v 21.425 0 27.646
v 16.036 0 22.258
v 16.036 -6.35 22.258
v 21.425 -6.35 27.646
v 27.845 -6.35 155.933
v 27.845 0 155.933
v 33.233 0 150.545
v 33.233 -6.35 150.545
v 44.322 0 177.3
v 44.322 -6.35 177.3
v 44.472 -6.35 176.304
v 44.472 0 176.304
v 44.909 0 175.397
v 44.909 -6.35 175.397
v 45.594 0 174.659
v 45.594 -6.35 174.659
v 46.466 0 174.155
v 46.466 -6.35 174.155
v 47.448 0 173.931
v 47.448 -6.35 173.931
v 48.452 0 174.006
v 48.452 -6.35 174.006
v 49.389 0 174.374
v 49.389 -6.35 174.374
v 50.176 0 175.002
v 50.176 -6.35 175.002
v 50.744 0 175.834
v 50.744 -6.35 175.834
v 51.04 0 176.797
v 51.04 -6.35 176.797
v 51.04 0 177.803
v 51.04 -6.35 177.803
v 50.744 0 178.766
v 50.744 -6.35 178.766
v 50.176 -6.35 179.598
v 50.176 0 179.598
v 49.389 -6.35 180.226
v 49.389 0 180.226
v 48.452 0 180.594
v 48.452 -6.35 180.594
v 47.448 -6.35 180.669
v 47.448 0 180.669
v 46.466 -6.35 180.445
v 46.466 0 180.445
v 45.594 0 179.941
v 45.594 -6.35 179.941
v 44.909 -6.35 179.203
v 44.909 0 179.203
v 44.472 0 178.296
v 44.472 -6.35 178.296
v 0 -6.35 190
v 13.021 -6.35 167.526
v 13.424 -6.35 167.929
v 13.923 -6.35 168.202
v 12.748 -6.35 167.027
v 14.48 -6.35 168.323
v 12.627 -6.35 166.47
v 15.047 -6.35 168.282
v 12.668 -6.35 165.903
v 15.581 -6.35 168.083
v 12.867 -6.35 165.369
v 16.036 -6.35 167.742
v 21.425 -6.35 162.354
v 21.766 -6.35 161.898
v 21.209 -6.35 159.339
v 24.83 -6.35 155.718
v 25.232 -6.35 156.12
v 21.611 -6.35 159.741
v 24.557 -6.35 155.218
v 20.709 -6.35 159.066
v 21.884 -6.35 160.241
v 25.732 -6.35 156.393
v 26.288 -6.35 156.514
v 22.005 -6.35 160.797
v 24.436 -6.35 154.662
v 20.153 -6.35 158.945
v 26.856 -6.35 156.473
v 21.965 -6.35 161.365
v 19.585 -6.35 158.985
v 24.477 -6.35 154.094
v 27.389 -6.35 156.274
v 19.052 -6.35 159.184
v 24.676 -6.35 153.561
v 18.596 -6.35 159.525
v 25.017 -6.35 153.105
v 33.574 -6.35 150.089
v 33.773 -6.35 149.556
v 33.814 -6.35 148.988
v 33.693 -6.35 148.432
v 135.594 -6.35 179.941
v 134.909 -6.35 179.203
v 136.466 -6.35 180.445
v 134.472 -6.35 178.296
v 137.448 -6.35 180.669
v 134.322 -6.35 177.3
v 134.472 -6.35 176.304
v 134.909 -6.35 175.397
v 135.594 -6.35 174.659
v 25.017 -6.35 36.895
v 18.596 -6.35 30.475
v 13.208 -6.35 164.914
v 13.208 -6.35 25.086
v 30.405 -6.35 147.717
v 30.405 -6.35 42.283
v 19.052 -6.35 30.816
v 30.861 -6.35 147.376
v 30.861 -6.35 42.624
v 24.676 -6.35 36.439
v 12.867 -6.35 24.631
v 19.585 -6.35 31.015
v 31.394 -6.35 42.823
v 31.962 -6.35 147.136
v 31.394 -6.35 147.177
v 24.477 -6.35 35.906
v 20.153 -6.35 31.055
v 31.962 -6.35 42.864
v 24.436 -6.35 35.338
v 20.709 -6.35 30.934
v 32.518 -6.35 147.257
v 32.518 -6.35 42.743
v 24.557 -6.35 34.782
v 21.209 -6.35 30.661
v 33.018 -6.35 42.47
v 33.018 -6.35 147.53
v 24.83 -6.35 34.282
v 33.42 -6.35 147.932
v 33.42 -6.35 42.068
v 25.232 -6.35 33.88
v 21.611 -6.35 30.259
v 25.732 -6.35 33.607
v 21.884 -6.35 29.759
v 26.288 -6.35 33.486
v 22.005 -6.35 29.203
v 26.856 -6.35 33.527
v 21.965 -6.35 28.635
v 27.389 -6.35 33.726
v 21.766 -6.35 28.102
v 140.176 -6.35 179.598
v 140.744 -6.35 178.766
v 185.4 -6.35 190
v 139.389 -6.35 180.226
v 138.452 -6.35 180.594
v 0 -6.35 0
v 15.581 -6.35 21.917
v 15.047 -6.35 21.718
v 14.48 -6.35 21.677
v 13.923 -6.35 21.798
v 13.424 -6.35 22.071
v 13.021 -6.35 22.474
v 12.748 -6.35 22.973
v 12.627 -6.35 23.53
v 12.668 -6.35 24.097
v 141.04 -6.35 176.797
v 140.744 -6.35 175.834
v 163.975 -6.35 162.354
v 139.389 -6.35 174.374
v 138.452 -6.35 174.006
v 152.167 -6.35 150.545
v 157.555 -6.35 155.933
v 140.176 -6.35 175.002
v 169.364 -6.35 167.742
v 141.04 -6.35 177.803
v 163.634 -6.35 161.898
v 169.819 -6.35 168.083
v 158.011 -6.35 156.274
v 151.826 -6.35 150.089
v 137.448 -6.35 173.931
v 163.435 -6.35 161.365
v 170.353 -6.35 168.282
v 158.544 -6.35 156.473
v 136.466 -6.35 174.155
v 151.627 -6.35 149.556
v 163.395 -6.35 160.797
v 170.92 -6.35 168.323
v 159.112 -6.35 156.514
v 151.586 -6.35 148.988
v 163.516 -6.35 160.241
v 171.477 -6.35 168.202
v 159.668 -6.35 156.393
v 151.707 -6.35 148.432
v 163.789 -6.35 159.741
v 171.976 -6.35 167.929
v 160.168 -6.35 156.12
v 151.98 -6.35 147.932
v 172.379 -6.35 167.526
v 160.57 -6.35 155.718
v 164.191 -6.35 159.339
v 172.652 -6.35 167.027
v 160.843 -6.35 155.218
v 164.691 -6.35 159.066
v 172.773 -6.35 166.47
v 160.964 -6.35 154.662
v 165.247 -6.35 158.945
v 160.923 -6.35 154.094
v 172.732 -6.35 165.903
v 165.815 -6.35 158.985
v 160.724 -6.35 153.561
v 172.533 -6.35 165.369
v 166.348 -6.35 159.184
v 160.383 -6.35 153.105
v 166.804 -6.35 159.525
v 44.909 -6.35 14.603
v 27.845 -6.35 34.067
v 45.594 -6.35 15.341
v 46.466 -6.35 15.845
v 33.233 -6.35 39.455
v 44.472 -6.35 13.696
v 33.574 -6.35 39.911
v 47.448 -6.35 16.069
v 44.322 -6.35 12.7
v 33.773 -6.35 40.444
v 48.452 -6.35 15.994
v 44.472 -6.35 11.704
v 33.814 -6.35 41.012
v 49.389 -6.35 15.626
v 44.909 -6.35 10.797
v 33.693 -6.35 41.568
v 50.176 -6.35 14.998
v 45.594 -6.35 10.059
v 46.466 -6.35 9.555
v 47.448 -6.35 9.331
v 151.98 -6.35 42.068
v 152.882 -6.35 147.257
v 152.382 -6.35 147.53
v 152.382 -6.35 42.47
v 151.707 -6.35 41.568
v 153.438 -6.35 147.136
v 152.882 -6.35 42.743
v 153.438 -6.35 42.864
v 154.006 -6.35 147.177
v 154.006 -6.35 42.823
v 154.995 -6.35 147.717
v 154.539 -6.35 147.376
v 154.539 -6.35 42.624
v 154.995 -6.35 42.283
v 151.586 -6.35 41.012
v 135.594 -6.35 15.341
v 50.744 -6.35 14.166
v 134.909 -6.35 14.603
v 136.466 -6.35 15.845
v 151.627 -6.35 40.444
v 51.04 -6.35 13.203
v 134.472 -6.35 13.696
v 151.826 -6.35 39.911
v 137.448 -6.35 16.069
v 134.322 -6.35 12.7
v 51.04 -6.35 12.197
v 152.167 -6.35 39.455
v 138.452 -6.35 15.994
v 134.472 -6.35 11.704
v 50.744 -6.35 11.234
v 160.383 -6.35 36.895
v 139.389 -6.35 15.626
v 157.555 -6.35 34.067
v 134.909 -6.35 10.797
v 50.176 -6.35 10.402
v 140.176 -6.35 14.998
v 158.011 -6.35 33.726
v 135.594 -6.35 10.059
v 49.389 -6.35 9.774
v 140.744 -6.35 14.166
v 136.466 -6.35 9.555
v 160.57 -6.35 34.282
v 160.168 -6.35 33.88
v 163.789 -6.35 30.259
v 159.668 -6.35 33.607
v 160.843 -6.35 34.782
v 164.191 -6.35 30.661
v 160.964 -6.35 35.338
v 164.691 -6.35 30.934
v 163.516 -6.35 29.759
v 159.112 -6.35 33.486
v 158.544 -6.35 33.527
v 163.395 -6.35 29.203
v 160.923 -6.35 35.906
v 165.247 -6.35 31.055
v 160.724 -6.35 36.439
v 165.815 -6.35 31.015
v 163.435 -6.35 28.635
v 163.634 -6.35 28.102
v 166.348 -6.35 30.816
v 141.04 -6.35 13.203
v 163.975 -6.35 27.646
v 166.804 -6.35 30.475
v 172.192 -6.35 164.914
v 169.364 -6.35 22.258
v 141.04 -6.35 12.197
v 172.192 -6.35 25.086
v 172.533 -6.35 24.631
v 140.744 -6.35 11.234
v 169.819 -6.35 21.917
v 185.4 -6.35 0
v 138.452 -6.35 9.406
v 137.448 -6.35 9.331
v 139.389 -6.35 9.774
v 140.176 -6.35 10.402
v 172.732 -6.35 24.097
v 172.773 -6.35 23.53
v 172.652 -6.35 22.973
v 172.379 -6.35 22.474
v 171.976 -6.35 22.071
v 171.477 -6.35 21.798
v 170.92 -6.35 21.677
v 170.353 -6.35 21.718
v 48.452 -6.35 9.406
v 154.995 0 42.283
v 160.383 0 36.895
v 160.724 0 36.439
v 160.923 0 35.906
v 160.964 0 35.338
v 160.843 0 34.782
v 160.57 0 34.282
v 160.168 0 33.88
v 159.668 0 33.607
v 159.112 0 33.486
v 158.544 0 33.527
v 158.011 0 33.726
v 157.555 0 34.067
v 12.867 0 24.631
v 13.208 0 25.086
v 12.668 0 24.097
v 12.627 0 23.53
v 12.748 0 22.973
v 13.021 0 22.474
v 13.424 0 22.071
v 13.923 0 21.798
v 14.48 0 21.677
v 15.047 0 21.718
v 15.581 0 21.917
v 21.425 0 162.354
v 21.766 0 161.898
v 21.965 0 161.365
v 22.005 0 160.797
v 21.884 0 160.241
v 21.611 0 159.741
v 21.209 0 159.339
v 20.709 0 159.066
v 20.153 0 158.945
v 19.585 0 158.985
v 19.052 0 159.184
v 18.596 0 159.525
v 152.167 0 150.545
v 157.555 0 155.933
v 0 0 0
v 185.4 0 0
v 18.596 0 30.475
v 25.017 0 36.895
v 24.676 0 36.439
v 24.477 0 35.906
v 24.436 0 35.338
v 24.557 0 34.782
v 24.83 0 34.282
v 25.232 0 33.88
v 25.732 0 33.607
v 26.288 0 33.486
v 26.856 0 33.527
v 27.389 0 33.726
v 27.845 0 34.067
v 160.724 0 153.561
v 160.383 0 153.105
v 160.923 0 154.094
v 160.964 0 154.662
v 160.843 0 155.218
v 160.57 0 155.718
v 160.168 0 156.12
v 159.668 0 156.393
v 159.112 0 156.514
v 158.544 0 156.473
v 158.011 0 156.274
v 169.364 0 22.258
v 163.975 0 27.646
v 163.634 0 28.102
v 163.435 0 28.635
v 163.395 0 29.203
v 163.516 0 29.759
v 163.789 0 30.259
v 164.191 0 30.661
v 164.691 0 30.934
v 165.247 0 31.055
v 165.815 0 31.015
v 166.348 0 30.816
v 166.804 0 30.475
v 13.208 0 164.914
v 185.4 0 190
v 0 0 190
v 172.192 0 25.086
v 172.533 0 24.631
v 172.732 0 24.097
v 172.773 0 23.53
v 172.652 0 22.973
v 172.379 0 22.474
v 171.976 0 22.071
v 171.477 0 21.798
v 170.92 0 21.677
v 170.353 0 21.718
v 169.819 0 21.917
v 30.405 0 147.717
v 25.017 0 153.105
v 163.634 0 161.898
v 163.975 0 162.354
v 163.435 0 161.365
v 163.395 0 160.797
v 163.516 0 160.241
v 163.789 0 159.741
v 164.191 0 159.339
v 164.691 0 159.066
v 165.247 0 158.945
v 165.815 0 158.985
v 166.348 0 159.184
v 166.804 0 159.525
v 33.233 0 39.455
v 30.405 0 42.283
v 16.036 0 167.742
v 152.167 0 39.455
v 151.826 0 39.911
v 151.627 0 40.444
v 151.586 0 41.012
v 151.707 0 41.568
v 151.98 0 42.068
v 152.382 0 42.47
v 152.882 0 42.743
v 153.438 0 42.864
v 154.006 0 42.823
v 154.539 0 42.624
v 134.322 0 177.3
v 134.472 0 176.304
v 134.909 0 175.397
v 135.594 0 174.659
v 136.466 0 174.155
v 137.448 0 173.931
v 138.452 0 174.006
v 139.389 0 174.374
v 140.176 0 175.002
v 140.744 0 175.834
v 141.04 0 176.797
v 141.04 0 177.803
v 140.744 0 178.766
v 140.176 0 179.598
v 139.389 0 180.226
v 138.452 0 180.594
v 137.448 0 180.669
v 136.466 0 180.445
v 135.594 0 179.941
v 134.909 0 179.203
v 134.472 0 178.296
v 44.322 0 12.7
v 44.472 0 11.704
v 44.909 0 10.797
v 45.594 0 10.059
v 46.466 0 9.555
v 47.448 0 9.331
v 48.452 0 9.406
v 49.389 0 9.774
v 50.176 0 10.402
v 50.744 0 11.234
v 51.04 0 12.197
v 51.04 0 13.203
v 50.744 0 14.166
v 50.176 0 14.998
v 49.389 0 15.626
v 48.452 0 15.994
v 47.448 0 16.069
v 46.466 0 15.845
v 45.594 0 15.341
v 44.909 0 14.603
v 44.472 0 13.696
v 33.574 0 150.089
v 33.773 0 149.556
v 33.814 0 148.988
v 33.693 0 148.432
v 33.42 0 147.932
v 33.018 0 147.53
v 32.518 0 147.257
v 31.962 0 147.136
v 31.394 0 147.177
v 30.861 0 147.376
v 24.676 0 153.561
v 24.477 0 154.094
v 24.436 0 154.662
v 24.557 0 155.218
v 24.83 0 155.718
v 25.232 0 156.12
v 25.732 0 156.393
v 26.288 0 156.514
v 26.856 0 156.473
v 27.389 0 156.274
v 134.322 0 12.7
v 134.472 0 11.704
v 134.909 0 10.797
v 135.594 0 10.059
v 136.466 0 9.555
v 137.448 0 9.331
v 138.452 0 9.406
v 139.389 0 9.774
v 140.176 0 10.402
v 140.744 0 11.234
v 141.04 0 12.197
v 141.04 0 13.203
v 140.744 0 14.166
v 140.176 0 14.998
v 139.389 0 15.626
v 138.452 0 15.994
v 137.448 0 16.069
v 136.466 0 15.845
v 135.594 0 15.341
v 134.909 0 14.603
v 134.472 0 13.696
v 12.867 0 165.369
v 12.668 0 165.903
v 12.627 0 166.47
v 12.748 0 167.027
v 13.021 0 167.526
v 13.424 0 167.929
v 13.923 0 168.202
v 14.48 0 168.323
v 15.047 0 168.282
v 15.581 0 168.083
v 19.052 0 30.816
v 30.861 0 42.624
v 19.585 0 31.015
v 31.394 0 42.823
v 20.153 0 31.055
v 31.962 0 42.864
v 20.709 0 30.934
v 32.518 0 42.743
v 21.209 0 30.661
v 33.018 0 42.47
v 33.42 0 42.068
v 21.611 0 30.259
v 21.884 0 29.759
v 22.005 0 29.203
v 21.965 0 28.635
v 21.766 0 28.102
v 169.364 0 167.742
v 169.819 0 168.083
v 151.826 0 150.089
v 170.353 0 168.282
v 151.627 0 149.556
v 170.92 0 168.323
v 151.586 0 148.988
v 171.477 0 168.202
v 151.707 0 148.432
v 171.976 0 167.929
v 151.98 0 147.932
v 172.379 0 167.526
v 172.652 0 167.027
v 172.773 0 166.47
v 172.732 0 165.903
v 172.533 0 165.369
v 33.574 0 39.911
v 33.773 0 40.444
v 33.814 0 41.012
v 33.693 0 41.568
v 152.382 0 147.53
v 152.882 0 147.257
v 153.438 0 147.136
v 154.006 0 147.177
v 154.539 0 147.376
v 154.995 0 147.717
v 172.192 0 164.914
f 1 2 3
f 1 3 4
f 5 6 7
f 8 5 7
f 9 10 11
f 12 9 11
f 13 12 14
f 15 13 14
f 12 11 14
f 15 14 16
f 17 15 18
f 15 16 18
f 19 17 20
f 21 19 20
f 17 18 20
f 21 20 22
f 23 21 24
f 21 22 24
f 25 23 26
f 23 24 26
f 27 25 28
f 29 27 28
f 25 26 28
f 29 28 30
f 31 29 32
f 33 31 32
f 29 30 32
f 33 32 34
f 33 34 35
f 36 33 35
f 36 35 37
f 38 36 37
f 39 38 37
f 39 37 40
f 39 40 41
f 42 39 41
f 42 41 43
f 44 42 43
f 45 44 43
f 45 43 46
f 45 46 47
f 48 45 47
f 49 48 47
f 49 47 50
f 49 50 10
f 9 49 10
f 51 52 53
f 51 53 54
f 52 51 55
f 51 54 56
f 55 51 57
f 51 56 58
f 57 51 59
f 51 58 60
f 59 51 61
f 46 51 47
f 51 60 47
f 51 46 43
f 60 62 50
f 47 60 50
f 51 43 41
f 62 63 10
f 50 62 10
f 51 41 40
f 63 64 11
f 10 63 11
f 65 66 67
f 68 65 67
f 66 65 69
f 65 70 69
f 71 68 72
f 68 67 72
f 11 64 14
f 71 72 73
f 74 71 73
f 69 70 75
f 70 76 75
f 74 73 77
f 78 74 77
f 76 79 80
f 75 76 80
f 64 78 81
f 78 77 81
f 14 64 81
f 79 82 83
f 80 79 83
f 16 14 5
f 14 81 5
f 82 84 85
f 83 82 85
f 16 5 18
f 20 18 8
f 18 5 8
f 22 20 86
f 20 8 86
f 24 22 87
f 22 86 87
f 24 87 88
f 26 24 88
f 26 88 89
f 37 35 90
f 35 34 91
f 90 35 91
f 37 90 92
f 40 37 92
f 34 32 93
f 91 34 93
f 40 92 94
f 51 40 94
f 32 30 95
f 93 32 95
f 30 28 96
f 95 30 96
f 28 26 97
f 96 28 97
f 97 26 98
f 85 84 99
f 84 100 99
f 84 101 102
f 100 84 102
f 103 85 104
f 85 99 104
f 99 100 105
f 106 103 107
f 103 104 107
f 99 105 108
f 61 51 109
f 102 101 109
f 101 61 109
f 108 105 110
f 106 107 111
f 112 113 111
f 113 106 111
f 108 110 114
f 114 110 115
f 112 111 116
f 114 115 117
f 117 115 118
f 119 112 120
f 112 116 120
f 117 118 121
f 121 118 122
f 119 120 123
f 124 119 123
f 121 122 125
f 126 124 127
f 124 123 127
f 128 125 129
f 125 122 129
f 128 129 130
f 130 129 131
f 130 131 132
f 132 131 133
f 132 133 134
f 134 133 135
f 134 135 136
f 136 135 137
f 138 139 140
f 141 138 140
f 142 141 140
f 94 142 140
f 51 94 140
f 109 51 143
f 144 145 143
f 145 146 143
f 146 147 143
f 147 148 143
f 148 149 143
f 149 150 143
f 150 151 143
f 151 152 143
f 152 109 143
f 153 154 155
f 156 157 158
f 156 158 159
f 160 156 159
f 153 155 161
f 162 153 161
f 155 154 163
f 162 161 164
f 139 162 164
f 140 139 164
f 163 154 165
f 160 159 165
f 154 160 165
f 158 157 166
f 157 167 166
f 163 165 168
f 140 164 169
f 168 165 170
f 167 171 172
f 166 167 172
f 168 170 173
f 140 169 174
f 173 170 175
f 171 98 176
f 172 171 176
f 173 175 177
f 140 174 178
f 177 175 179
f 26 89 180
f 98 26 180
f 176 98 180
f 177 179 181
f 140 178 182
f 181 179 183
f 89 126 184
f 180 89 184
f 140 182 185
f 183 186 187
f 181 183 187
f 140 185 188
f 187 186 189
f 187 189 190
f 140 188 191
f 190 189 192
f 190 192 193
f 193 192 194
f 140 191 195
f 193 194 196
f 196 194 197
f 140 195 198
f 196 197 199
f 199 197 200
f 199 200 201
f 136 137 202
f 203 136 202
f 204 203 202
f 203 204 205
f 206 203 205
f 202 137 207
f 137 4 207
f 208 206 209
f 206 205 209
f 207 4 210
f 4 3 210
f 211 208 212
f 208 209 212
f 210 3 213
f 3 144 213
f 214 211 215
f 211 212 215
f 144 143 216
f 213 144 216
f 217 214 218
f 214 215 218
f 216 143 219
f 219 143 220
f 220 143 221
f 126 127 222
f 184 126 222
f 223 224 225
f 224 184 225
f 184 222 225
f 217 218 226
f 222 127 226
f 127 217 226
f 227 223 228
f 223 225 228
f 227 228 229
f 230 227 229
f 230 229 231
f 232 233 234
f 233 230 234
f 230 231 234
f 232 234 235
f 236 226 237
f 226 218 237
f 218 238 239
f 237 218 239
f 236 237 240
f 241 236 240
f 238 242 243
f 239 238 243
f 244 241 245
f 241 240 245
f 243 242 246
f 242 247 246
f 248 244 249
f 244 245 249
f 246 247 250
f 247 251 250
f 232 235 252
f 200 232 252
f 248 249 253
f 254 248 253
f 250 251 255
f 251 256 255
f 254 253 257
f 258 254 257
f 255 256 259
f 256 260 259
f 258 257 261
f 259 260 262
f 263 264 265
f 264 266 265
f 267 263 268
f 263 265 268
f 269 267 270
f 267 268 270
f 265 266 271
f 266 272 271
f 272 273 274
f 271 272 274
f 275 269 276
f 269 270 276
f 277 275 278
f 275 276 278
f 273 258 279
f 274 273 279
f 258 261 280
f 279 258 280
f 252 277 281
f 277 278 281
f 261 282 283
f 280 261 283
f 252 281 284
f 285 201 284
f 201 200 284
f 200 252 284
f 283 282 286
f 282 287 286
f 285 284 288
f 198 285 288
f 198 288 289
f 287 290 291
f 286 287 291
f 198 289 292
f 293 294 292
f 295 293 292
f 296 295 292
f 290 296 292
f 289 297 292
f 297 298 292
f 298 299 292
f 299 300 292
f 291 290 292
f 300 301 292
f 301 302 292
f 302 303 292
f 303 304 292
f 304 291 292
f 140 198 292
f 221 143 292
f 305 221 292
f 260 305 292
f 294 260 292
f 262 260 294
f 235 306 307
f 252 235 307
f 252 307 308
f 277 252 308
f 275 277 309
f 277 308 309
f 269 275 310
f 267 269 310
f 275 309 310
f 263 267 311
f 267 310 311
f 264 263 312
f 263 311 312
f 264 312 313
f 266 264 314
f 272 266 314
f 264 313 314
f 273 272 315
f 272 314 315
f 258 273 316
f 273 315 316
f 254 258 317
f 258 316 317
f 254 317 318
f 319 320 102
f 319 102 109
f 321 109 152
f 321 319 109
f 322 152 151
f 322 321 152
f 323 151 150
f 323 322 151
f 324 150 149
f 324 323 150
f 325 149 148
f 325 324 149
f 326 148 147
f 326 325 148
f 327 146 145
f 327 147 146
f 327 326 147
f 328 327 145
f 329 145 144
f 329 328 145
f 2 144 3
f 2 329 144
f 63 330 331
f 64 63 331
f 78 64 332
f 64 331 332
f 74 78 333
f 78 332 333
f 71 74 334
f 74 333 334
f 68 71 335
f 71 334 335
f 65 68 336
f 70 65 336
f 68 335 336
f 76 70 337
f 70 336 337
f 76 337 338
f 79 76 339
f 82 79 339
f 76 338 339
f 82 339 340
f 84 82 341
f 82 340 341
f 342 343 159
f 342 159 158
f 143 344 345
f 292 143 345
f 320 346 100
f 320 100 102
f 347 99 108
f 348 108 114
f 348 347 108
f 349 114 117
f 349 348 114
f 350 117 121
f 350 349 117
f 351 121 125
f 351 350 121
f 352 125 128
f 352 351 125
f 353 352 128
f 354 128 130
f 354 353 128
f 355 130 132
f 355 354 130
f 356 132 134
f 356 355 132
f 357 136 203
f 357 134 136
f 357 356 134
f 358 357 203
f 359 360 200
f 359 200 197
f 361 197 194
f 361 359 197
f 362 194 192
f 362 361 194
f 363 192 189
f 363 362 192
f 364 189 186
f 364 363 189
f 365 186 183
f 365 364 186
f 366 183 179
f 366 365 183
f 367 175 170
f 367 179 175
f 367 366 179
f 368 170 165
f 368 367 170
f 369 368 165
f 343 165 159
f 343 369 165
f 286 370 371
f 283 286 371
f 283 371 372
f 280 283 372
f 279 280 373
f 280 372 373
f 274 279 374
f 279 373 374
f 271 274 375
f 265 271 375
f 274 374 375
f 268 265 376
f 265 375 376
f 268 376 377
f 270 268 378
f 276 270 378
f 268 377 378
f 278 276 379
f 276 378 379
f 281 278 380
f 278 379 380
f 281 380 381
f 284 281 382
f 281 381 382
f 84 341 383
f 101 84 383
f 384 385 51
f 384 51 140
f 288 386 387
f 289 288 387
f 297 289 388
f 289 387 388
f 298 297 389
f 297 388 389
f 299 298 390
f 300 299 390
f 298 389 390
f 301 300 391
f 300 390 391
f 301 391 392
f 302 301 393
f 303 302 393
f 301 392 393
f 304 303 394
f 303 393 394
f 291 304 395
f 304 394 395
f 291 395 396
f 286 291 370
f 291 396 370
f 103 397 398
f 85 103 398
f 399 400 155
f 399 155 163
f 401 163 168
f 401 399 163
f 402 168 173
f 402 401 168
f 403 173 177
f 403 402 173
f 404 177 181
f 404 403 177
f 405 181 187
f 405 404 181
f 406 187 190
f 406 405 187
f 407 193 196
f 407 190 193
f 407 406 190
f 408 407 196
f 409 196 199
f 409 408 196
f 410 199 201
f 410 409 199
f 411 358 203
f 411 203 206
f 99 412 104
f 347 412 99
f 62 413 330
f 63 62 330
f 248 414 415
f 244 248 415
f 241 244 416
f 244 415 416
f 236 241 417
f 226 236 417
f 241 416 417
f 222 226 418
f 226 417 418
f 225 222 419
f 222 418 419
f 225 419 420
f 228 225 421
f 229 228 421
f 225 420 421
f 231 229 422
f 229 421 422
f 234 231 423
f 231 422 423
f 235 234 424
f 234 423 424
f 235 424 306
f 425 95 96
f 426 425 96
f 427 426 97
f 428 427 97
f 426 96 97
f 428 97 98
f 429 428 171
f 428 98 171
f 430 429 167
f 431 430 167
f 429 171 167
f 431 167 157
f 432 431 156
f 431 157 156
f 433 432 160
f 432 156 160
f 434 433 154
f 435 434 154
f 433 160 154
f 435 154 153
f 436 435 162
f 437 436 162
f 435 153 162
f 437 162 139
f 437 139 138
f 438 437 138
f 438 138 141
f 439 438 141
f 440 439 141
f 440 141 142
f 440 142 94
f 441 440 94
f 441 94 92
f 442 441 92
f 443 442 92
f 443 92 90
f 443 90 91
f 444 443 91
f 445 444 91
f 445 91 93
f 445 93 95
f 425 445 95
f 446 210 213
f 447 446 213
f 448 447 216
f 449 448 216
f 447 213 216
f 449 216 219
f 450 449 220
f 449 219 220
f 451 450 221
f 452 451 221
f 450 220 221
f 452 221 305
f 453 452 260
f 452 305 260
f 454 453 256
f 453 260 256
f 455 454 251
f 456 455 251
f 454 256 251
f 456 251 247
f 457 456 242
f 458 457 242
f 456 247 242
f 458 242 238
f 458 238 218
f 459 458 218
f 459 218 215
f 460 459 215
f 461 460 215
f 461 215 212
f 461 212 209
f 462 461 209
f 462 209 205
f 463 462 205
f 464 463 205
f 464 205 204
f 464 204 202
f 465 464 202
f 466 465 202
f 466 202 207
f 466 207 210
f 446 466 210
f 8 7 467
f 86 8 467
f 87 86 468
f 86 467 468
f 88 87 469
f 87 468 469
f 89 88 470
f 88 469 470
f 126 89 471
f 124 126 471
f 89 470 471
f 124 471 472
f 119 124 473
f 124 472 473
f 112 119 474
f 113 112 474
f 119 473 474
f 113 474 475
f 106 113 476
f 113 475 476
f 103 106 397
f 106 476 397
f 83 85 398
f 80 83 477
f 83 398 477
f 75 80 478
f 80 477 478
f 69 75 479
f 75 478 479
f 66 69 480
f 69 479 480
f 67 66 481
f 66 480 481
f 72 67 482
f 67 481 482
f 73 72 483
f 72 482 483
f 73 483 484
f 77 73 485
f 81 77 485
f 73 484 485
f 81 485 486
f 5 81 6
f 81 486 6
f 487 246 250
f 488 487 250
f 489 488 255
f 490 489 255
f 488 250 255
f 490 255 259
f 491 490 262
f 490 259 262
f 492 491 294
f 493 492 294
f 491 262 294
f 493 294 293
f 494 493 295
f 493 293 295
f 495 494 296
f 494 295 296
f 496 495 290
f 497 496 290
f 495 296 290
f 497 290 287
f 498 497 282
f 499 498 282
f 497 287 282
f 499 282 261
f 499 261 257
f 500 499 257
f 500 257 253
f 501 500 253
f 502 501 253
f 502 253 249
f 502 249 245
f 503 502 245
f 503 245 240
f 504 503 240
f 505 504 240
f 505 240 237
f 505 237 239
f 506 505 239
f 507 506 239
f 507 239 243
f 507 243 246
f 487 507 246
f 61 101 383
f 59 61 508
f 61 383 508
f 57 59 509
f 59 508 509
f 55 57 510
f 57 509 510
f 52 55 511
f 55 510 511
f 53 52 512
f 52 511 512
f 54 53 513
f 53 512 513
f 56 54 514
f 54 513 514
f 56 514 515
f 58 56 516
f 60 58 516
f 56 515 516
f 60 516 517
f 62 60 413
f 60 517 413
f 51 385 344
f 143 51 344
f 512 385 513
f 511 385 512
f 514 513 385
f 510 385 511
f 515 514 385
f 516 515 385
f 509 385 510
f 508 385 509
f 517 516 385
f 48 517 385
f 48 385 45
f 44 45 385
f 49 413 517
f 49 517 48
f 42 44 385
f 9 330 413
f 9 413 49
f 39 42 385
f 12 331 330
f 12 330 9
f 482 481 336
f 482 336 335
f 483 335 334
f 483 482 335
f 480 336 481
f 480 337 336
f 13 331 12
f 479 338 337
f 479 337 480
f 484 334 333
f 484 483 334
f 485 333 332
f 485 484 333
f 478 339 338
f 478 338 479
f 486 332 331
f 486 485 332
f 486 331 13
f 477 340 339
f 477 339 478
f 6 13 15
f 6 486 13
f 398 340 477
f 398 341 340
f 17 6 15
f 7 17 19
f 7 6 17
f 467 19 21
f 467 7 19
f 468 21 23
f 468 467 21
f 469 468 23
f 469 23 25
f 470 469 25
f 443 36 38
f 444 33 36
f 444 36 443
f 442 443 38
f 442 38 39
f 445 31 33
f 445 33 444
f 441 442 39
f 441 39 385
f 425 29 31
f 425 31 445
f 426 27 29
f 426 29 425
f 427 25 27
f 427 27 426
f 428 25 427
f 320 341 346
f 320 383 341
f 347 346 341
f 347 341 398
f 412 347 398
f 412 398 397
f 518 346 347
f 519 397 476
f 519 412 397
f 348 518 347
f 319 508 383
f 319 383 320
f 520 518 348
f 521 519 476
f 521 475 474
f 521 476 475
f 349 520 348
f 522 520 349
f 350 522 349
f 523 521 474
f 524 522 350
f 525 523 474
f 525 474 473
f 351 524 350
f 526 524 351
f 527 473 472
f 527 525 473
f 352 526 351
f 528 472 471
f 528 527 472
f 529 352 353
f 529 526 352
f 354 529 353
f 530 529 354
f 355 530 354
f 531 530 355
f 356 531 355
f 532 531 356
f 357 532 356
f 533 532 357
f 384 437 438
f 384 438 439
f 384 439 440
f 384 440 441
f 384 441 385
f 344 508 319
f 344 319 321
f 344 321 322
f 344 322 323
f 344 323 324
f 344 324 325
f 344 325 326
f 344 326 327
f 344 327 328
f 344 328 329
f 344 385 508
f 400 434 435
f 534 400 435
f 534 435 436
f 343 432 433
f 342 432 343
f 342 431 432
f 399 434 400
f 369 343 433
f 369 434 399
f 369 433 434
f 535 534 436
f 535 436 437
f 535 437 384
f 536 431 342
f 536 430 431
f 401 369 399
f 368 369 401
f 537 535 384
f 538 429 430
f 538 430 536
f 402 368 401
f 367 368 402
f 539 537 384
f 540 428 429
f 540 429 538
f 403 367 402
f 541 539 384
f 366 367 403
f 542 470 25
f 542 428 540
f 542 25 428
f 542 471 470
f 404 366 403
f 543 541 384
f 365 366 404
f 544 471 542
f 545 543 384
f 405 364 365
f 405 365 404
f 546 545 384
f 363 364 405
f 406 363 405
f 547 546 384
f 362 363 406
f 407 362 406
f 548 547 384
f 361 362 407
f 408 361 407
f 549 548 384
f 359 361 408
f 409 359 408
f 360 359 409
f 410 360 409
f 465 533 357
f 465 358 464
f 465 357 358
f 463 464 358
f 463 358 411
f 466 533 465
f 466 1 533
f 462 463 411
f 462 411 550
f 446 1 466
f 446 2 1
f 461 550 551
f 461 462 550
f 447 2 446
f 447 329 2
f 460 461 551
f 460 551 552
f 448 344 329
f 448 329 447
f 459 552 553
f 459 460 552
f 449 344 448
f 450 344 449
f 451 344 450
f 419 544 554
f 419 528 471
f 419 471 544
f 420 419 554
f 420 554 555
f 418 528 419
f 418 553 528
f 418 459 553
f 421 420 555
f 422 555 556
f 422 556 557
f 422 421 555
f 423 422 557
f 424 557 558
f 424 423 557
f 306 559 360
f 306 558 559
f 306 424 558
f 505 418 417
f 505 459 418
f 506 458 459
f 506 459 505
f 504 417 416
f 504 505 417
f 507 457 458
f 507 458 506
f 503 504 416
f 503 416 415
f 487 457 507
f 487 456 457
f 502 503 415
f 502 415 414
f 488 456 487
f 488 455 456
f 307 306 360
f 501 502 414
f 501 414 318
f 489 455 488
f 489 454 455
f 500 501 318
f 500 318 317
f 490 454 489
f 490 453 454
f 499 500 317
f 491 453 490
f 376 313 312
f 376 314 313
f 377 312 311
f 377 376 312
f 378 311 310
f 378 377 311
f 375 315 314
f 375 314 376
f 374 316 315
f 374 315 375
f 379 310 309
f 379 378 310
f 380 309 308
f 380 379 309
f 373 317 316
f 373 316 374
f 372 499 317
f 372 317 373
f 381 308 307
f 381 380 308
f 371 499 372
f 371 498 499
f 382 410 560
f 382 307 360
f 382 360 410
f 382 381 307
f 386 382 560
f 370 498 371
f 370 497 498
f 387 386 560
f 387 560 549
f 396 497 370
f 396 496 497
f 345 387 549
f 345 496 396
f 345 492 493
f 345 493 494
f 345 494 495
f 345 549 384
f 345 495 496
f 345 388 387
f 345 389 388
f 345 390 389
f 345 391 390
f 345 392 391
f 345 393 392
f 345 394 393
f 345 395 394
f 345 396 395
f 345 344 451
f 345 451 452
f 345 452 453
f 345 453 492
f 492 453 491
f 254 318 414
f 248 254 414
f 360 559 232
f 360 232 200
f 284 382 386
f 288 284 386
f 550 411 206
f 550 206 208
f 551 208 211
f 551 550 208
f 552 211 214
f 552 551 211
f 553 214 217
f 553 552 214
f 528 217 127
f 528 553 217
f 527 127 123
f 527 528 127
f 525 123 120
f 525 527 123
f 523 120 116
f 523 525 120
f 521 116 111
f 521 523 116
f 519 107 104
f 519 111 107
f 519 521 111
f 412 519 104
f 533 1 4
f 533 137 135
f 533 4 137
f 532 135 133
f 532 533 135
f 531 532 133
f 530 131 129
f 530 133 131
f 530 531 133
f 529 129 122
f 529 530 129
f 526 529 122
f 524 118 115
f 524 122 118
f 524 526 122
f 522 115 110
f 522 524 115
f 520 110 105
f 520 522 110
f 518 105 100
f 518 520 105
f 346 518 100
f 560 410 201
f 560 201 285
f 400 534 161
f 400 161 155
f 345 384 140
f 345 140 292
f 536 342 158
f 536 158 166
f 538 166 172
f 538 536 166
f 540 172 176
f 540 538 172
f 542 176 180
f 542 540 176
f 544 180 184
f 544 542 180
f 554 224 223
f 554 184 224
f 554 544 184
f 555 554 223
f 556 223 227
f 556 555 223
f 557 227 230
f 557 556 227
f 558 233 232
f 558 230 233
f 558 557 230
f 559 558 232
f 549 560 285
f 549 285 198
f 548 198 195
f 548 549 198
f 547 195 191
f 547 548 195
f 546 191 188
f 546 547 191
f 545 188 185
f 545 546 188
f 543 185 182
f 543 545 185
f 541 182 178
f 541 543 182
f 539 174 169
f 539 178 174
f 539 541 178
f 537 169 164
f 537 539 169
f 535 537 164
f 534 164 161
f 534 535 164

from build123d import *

# Parameters (mm, degrees)
SKETCH1_W              = 185.4
SKETCH1_H              = 190
BASE_PLATE_DEPTH       = 6.35
SLOTS_DEPTH            = 7.35
FEET_CONNECTION_HOLE_D = 6.7564


with BuildPart() as part:
    # Sketch1 → base plate (new body)
    with BuildSketch(Plane(origin=(0, 0, 0), x_dir=(1, 0, 0), z_dir=(0, 1, 0))):
        with Locations((92.7, -95)):
            Rectangle(SKETCH1_W, SKETCH1_H)
    extrude(amount=-BASE_PLATE_DEPTH)

    # Sketch3 → slots (cut, through all)
    with BuildSketch(Plane(origin=(0, 0, 0), x_dir=(1, 0, 0), z_dir=(0, 1, 0))):
        with BuildLine():
            ThreePointArc((21.424612456, -27.64618524), (21.424612456, -30.474612456), (18.59618524, -30.474612456))
            Line((18.59618524, -30.474612456), (13.208031568, -25.086458783))
            ThreePointArc((13.208031568, -25.086458783), (13.208031568, -22.258031568), (16.036458783, -22.258031568))
            Line((16.036458783, -22.258031568), (21.424612456, -27.64618524))
        make_face()
        with BuildLine():
            Line((169.363541217, -22.258031568), (163.975387544, -27.64618524))
            ThreePointArc((163.975387544, -27.64618524), (163.975387544, -30.474612456), (166.80381476, -30.474612456))
            Line((166.80381476, -30.474612456), (172.191968432, -25.086458783))
            ThreePointArc((172.191968432, -25.086458783), (172.191968432, -22.258031568), (169.363541217, -22.258031568))
        make_face()
        with BuildLine():
            Line((154.995131423, -42.283295792), (160.383285096, -36.895142119))
            ThreePointArc((160.383285096, -36.895142119), (160.383285096, -34.066714904), (157.554857881, -34.066714904))
            Line((157.554857881, -34.066714904), (152.166704208, -39.454868577))
            ThreePointArc((152.166704208, -39.454868577), (152.166704208, -42.283295792), (154.995131423, -42.283295792))
        make_face()
        with BuildLine():
            ThreePointArc((160.383285096, -153.104857881), (160.383285096, -155.933285096), (157.554857881, -155.933285096))
            Line((157.554857881, -155.933285096), (152.166704208, -150.545131423))
            ThreePointArc((152.166704208, -150.545131423), (152.166704208, -147.716704208), (154.995131423, -147.716704208))
            Line((154.995131423, -147.716704208), (160.383285096, -153.104857881))
        make_face()
        with BuildLine():
            ThreePointArc((163.975387544, -162.35381476), (163.975387544, -159.525387544), (166.80381476, -159.525387544))
            Line((166.80381476, -159.525387544), (172.191968432, -164.913541217))
            ThreePointArc((172.191968432, -164.913541217), (172.191968432, -167.741968432), (169.363541217, -167.741968432))
            Line((169.363541217, -167.741968432), (163.975387544, -162.35381476))
        make_face()
        with BuildLine():
            Line((16.036458783, -167.741968432), (21.424612456, -162.35381476))
            ThreePointArc((21.424612456, -162.35381476), (21.424612456, -159.525387544), (18.59618524, -159.525387544))
            Line((18.59618524, -159.525387544), (13.208031568, -164.913541217))
            ThreePointArc((13.208031568, -164.913541217), (13.208031568, -167.741968432), (16.036458783, -167.741968432))
        make_face()
        with BuildLine():
            Line((30.404868577, -147.716704208), (25.016714904, -153.104857881))
            ThreePointArc((25.016714904, -153.104857881), (25.016714904, -155.933285096), (27.845142119, -155.933285096))
            Line((27.845142119, -155.933285096), (33.233295792, -150.545131423))
            ThreePointArc((33.233295792, -150.545131423), (33.233295792, -147.716704208), (30.404868577, -147.716704208))
        make_face()
        with BuildLine():
            Line((30.404868577, -42.283295792), (25.016714904, -36.895142119))
            ThreePointArc((25.016714904, -36.895142119), (25.016714904, -34.066714904), (27.845142119, -34.066714904))
            Line((27.845142119, -34.066714904), (33.233295792, -39.454868577))
            ThreePointArc((33.233295792, -39.454868577), (33.233295792, -42.283295792), (30.404868577, -42.283295792))
        make_face()
    extrude(amount=-SLOTS_DEPTH, mode=Mode.SUBTRACT)

    # Feet connection hole (through all)
    with Locations(Plane(origin=(0, 0, 0), x_dir=(1, 0, 0), z_dir=(0, 1, 0))):
        with Locations((47.7, -177.3), (137.7, -12.7), (47.7, -12.7), (137.7, -177.3)):
            Hole(FEET_CONNECTION_HOLE_D / 2)


solid = part.part
